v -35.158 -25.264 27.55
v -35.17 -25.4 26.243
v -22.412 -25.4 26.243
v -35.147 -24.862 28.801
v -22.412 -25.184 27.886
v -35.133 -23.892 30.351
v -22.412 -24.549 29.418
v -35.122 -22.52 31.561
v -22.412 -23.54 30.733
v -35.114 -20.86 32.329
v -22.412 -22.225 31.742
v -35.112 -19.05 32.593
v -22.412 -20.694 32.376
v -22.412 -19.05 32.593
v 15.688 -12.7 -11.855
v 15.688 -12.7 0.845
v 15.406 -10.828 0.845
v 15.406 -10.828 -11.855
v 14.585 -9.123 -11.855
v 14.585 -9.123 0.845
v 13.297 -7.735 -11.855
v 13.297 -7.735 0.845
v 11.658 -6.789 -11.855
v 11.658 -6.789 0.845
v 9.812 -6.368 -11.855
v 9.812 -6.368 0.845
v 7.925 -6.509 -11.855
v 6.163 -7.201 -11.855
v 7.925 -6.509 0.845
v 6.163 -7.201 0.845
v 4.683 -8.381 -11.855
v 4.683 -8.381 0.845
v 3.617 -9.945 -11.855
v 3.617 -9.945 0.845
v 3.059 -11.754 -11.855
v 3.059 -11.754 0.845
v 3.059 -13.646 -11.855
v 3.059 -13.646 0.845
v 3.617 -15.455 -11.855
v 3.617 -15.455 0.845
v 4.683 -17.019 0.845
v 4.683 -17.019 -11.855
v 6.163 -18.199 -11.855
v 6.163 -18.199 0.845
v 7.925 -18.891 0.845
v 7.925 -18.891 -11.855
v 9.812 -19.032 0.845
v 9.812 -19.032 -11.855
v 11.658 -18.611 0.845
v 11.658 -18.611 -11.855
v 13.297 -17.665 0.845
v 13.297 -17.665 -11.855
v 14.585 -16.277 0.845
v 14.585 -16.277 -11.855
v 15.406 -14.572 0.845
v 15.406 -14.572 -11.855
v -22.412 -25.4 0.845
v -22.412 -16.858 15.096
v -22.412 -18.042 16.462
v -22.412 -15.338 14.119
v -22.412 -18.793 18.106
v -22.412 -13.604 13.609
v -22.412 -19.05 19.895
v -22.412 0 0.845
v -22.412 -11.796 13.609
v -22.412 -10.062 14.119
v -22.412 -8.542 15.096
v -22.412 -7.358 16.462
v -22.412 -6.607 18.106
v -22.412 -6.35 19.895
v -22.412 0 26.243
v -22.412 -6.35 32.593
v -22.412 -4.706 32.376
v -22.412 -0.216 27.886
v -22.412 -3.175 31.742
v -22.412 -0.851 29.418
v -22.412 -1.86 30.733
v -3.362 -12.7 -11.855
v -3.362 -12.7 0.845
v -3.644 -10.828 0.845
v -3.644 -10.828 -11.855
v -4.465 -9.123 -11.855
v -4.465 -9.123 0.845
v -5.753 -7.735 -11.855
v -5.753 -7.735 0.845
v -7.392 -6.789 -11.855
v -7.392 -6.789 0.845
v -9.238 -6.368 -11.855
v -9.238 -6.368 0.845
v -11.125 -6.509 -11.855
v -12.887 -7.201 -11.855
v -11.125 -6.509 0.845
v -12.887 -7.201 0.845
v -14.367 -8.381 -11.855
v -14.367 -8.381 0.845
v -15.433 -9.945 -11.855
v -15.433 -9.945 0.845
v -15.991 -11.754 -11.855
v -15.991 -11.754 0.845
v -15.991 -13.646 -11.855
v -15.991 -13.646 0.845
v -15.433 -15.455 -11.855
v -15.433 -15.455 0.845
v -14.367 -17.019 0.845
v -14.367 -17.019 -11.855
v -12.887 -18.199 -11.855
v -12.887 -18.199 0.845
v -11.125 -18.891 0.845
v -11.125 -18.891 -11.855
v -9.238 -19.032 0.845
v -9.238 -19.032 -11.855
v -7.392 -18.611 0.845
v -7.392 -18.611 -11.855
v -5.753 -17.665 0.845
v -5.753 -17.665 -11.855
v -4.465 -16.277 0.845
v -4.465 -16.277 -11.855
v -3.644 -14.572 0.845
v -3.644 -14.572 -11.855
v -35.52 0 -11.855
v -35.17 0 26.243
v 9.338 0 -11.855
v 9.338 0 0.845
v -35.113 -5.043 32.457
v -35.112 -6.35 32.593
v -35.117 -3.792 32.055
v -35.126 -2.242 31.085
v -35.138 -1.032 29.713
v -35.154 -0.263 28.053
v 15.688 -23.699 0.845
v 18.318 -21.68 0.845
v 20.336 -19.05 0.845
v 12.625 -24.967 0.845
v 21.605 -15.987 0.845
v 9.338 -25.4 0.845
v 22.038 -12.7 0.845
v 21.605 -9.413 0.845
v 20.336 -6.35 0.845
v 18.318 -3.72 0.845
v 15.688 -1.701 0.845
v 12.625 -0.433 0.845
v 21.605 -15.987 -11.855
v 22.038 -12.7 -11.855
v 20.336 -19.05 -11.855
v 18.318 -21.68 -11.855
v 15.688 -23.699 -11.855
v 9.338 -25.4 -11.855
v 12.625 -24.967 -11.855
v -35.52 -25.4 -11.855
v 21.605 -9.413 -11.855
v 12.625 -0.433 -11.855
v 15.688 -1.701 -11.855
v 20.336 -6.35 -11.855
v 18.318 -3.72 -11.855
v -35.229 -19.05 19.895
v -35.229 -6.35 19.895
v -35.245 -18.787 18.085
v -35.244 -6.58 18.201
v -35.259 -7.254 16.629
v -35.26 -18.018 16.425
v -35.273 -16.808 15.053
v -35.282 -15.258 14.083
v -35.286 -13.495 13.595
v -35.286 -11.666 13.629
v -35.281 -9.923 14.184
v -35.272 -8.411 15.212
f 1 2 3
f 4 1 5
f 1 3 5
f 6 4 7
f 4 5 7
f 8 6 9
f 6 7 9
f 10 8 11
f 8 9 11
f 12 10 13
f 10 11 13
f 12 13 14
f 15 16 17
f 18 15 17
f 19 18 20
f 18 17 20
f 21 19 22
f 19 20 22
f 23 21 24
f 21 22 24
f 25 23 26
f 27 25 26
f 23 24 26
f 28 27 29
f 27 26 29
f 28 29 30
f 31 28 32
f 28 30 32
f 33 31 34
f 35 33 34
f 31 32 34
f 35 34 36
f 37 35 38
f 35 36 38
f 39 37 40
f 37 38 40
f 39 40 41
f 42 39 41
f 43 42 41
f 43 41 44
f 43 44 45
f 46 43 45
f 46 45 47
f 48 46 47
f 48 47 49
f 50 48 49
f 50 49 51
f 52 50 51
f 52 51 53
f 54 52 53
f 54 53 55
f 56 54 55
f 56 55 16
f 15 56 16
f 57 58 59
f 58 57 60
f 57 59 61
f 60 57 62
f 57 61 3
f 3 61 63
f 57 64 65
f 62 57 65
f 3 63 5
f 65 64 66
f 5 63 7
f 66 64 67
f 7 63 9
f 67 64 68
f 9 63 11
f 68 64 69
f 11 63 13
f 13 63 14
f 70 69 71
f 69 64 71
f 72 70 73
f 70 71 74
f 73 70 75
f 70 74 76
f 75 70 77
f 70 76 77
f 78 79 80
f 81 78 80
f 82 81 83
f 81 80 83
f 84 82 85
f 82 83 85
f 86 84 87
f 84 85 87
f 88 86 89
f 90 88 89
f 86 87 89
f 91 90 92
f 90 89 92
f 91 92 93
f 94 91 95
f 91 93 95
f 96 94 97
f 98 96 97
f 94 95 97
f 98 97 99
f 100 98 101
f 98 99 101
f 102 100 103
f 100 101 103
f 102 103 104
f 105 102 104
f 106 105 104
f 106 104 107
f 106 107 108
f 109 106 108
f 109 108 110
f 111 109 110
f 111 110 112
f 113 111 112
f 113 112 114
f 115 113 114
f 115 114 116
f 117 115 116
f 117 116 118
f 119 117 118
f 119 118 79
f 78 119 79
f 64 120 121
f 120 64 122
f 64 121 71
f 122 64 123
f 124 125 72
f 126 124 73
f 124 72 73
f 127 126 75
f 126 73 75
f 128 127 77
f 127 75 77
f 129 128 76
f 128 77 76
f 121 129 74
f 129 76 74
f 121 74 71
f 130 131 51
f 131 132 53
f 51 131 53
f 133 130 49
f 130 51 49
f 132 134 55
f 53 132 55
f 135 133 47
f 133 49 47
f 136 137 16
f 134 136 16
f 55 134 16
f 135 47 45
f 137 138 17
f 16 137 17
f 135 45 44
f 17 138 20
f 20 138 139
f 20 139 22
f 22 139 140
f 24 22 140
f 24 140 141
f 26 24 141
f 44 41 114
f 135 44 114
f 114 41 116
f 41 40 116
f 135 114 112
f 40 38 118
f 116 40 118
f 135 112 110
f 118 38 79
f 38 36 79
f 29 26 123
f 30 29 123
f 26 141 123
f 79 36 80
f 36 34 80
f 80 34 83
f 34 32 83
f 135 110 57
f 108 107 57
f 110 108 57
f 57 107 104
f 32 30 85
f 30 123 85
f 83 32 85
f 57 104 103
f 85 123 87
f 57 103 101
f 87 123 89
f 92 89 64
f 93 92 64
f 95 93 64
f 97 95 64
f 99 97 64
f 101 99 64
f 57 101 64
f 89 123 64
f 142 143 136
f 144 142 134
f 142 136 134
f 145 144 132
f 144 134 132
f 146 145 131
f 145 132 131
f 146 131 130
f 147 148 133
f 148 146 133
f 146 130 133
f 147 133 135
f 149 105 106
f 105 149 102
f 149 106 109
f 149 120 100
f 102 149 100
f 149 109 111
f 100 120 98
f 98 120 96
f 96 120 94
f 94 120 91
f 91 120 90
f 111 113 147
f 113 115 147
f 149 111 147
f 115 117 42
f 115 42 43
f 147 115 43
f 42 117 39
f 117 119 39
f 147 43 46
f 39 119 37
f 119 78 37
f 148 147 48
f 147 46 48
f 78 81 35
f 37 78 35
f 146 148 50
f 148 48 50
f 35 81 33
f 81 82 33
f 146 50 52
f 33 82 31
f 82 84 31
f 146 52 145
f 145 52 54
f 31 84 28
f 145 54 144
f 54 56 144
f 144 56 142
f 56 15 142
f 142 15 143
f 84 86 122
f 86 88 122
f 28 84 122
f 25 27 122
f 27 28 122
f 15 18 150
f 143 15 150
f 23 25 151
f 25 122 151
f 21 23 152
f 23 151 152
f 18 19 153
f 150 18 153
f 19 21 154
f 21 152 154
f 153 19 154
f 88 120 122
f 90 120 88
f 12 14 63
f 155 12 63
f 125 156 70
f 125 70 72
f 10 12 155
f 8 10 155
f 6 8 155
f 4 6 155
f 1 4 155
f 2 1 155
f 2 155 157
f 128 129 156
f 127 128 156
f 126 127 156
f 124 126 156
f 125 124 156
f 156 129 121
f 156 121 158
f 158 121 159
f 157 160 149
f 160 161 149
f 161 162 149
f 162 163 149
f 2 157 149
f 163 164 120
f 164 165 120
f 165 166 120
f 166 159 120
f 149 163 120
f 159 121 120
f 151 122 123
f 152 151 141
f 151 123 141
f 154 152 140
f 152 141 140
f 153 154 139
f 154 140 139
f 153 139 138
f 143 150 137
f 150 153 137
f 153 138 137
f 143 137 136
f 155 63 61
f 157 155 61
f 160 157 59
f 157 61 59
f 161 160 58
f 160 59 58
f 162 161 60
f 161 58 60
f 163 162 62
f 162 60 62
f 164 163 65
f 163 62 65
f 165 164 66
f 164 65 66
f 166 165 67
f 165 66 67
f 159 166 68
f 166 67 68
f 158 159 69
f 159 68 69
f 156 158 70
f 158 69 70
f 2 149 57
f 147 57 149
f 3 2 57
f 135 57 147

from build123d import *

# Parameters (mm, degrees)
F1_DEPTH = 25.4
F2_R     = 6.35
F3_DEPTH = 25.4
F5_DEPTH = 25.4
F7_DEPTH = 25.4


with BuildPart() as f1:
    # F0 (on Front) → F1 (new body)
    with BuildSketch(Plane.XZ):
        Polygon((-22.412052, 32.592865), (-35.112052, 32.592865), (-35.519832, -11.855265), (22.037948, -11.855265), (22.037948, 0.844735), (-22.412052, 0.844735), align=None)
    extrude(amount=F1_DEPTH)

    # F2 (on face) → F3 (cut)
    with BuildSketch(Plane.XY.offset(0.844735)):
        with Locations((-9.712052, -12.7)):
            Circle(F2_R)
        with Locations((9.337948, -12.7)):
            Circle(F2_R)
        with BuildLine():
            Line((22.037948, 0), (9.337948, 0))
            ThreePointArc((9.337948, 0), (18.318204, -3.719744), (22.037948, -12.7))
            Line((22.037948, -12.7), (22.037948, 0))
        make_face()
        with BuildLine():
            Line((22.037948, -25.4), (22.037948, -12.7))
            ThreePointArc((22.037948, -12.7), (18.318204, -21.680256), (9.337948, -25.4))
            Line((9.337948, -25.4), (22.037948, -25.4))
        make_face()
    extrude(amount=-F3_DEPTH, mode=Mode.SUBTRACT)

    # F4 (on face) → F5 (cut)
    with BuildSketch(Plane.YZ.offset(-22.412052)):
        with BuildLine():
            ThreePointArc((-25.4, 26.242865), (-23.540128, 30.732993), (-19.05, 32.592865))
            Line((-19.05, 32.592865), (-25.4, 32.592865))
            Line((-25.4, 32.592865), (-25.4, 26.242865))
        make_face()
        with BuildLine():
            Line((0, 32.592865), (-6.35, 32.592865))
            ThreePointArc((-6.35, 32.592865), (-1.859872, 30.732993), (0, 26.242865))
            Line((0, 26.242865), (0, 32.592865))
        make_face()
    extrude(amount=-F5_DEPTH, mode=Mode.SUBTRACT)

    # F6 (on face) → F7 (cut)
    with BuildSketch(Plane.YZ.offset(-22.412052)):
        with BuildLine():
            ThreePointArc((-19.05, 19.894735), (-12.7, 26.244735), (-6.35, 19.894735))
            Line((-6.35, 19.894735), (-6.35, 32.592865))
            Line((-6.35, 32.592865), (-19.05, 32.592865))
            Line((-19.05, 32.592865), (-19.05, 19.894735))
        make_face()
        with BuildLine():
            ThreePointArc((-19.05, 19.894735), (-12.7, 13.544735), (-6.35, 19.894735))
            ThreePointArc((-6.35, 19.894735), (-12.7, 26.244735), (-19.05, 19.894735))
        make_face()
    extrude(amount=-F7_DEPTH, mode=Mode.SUBTRACT)


solid = f1.part
